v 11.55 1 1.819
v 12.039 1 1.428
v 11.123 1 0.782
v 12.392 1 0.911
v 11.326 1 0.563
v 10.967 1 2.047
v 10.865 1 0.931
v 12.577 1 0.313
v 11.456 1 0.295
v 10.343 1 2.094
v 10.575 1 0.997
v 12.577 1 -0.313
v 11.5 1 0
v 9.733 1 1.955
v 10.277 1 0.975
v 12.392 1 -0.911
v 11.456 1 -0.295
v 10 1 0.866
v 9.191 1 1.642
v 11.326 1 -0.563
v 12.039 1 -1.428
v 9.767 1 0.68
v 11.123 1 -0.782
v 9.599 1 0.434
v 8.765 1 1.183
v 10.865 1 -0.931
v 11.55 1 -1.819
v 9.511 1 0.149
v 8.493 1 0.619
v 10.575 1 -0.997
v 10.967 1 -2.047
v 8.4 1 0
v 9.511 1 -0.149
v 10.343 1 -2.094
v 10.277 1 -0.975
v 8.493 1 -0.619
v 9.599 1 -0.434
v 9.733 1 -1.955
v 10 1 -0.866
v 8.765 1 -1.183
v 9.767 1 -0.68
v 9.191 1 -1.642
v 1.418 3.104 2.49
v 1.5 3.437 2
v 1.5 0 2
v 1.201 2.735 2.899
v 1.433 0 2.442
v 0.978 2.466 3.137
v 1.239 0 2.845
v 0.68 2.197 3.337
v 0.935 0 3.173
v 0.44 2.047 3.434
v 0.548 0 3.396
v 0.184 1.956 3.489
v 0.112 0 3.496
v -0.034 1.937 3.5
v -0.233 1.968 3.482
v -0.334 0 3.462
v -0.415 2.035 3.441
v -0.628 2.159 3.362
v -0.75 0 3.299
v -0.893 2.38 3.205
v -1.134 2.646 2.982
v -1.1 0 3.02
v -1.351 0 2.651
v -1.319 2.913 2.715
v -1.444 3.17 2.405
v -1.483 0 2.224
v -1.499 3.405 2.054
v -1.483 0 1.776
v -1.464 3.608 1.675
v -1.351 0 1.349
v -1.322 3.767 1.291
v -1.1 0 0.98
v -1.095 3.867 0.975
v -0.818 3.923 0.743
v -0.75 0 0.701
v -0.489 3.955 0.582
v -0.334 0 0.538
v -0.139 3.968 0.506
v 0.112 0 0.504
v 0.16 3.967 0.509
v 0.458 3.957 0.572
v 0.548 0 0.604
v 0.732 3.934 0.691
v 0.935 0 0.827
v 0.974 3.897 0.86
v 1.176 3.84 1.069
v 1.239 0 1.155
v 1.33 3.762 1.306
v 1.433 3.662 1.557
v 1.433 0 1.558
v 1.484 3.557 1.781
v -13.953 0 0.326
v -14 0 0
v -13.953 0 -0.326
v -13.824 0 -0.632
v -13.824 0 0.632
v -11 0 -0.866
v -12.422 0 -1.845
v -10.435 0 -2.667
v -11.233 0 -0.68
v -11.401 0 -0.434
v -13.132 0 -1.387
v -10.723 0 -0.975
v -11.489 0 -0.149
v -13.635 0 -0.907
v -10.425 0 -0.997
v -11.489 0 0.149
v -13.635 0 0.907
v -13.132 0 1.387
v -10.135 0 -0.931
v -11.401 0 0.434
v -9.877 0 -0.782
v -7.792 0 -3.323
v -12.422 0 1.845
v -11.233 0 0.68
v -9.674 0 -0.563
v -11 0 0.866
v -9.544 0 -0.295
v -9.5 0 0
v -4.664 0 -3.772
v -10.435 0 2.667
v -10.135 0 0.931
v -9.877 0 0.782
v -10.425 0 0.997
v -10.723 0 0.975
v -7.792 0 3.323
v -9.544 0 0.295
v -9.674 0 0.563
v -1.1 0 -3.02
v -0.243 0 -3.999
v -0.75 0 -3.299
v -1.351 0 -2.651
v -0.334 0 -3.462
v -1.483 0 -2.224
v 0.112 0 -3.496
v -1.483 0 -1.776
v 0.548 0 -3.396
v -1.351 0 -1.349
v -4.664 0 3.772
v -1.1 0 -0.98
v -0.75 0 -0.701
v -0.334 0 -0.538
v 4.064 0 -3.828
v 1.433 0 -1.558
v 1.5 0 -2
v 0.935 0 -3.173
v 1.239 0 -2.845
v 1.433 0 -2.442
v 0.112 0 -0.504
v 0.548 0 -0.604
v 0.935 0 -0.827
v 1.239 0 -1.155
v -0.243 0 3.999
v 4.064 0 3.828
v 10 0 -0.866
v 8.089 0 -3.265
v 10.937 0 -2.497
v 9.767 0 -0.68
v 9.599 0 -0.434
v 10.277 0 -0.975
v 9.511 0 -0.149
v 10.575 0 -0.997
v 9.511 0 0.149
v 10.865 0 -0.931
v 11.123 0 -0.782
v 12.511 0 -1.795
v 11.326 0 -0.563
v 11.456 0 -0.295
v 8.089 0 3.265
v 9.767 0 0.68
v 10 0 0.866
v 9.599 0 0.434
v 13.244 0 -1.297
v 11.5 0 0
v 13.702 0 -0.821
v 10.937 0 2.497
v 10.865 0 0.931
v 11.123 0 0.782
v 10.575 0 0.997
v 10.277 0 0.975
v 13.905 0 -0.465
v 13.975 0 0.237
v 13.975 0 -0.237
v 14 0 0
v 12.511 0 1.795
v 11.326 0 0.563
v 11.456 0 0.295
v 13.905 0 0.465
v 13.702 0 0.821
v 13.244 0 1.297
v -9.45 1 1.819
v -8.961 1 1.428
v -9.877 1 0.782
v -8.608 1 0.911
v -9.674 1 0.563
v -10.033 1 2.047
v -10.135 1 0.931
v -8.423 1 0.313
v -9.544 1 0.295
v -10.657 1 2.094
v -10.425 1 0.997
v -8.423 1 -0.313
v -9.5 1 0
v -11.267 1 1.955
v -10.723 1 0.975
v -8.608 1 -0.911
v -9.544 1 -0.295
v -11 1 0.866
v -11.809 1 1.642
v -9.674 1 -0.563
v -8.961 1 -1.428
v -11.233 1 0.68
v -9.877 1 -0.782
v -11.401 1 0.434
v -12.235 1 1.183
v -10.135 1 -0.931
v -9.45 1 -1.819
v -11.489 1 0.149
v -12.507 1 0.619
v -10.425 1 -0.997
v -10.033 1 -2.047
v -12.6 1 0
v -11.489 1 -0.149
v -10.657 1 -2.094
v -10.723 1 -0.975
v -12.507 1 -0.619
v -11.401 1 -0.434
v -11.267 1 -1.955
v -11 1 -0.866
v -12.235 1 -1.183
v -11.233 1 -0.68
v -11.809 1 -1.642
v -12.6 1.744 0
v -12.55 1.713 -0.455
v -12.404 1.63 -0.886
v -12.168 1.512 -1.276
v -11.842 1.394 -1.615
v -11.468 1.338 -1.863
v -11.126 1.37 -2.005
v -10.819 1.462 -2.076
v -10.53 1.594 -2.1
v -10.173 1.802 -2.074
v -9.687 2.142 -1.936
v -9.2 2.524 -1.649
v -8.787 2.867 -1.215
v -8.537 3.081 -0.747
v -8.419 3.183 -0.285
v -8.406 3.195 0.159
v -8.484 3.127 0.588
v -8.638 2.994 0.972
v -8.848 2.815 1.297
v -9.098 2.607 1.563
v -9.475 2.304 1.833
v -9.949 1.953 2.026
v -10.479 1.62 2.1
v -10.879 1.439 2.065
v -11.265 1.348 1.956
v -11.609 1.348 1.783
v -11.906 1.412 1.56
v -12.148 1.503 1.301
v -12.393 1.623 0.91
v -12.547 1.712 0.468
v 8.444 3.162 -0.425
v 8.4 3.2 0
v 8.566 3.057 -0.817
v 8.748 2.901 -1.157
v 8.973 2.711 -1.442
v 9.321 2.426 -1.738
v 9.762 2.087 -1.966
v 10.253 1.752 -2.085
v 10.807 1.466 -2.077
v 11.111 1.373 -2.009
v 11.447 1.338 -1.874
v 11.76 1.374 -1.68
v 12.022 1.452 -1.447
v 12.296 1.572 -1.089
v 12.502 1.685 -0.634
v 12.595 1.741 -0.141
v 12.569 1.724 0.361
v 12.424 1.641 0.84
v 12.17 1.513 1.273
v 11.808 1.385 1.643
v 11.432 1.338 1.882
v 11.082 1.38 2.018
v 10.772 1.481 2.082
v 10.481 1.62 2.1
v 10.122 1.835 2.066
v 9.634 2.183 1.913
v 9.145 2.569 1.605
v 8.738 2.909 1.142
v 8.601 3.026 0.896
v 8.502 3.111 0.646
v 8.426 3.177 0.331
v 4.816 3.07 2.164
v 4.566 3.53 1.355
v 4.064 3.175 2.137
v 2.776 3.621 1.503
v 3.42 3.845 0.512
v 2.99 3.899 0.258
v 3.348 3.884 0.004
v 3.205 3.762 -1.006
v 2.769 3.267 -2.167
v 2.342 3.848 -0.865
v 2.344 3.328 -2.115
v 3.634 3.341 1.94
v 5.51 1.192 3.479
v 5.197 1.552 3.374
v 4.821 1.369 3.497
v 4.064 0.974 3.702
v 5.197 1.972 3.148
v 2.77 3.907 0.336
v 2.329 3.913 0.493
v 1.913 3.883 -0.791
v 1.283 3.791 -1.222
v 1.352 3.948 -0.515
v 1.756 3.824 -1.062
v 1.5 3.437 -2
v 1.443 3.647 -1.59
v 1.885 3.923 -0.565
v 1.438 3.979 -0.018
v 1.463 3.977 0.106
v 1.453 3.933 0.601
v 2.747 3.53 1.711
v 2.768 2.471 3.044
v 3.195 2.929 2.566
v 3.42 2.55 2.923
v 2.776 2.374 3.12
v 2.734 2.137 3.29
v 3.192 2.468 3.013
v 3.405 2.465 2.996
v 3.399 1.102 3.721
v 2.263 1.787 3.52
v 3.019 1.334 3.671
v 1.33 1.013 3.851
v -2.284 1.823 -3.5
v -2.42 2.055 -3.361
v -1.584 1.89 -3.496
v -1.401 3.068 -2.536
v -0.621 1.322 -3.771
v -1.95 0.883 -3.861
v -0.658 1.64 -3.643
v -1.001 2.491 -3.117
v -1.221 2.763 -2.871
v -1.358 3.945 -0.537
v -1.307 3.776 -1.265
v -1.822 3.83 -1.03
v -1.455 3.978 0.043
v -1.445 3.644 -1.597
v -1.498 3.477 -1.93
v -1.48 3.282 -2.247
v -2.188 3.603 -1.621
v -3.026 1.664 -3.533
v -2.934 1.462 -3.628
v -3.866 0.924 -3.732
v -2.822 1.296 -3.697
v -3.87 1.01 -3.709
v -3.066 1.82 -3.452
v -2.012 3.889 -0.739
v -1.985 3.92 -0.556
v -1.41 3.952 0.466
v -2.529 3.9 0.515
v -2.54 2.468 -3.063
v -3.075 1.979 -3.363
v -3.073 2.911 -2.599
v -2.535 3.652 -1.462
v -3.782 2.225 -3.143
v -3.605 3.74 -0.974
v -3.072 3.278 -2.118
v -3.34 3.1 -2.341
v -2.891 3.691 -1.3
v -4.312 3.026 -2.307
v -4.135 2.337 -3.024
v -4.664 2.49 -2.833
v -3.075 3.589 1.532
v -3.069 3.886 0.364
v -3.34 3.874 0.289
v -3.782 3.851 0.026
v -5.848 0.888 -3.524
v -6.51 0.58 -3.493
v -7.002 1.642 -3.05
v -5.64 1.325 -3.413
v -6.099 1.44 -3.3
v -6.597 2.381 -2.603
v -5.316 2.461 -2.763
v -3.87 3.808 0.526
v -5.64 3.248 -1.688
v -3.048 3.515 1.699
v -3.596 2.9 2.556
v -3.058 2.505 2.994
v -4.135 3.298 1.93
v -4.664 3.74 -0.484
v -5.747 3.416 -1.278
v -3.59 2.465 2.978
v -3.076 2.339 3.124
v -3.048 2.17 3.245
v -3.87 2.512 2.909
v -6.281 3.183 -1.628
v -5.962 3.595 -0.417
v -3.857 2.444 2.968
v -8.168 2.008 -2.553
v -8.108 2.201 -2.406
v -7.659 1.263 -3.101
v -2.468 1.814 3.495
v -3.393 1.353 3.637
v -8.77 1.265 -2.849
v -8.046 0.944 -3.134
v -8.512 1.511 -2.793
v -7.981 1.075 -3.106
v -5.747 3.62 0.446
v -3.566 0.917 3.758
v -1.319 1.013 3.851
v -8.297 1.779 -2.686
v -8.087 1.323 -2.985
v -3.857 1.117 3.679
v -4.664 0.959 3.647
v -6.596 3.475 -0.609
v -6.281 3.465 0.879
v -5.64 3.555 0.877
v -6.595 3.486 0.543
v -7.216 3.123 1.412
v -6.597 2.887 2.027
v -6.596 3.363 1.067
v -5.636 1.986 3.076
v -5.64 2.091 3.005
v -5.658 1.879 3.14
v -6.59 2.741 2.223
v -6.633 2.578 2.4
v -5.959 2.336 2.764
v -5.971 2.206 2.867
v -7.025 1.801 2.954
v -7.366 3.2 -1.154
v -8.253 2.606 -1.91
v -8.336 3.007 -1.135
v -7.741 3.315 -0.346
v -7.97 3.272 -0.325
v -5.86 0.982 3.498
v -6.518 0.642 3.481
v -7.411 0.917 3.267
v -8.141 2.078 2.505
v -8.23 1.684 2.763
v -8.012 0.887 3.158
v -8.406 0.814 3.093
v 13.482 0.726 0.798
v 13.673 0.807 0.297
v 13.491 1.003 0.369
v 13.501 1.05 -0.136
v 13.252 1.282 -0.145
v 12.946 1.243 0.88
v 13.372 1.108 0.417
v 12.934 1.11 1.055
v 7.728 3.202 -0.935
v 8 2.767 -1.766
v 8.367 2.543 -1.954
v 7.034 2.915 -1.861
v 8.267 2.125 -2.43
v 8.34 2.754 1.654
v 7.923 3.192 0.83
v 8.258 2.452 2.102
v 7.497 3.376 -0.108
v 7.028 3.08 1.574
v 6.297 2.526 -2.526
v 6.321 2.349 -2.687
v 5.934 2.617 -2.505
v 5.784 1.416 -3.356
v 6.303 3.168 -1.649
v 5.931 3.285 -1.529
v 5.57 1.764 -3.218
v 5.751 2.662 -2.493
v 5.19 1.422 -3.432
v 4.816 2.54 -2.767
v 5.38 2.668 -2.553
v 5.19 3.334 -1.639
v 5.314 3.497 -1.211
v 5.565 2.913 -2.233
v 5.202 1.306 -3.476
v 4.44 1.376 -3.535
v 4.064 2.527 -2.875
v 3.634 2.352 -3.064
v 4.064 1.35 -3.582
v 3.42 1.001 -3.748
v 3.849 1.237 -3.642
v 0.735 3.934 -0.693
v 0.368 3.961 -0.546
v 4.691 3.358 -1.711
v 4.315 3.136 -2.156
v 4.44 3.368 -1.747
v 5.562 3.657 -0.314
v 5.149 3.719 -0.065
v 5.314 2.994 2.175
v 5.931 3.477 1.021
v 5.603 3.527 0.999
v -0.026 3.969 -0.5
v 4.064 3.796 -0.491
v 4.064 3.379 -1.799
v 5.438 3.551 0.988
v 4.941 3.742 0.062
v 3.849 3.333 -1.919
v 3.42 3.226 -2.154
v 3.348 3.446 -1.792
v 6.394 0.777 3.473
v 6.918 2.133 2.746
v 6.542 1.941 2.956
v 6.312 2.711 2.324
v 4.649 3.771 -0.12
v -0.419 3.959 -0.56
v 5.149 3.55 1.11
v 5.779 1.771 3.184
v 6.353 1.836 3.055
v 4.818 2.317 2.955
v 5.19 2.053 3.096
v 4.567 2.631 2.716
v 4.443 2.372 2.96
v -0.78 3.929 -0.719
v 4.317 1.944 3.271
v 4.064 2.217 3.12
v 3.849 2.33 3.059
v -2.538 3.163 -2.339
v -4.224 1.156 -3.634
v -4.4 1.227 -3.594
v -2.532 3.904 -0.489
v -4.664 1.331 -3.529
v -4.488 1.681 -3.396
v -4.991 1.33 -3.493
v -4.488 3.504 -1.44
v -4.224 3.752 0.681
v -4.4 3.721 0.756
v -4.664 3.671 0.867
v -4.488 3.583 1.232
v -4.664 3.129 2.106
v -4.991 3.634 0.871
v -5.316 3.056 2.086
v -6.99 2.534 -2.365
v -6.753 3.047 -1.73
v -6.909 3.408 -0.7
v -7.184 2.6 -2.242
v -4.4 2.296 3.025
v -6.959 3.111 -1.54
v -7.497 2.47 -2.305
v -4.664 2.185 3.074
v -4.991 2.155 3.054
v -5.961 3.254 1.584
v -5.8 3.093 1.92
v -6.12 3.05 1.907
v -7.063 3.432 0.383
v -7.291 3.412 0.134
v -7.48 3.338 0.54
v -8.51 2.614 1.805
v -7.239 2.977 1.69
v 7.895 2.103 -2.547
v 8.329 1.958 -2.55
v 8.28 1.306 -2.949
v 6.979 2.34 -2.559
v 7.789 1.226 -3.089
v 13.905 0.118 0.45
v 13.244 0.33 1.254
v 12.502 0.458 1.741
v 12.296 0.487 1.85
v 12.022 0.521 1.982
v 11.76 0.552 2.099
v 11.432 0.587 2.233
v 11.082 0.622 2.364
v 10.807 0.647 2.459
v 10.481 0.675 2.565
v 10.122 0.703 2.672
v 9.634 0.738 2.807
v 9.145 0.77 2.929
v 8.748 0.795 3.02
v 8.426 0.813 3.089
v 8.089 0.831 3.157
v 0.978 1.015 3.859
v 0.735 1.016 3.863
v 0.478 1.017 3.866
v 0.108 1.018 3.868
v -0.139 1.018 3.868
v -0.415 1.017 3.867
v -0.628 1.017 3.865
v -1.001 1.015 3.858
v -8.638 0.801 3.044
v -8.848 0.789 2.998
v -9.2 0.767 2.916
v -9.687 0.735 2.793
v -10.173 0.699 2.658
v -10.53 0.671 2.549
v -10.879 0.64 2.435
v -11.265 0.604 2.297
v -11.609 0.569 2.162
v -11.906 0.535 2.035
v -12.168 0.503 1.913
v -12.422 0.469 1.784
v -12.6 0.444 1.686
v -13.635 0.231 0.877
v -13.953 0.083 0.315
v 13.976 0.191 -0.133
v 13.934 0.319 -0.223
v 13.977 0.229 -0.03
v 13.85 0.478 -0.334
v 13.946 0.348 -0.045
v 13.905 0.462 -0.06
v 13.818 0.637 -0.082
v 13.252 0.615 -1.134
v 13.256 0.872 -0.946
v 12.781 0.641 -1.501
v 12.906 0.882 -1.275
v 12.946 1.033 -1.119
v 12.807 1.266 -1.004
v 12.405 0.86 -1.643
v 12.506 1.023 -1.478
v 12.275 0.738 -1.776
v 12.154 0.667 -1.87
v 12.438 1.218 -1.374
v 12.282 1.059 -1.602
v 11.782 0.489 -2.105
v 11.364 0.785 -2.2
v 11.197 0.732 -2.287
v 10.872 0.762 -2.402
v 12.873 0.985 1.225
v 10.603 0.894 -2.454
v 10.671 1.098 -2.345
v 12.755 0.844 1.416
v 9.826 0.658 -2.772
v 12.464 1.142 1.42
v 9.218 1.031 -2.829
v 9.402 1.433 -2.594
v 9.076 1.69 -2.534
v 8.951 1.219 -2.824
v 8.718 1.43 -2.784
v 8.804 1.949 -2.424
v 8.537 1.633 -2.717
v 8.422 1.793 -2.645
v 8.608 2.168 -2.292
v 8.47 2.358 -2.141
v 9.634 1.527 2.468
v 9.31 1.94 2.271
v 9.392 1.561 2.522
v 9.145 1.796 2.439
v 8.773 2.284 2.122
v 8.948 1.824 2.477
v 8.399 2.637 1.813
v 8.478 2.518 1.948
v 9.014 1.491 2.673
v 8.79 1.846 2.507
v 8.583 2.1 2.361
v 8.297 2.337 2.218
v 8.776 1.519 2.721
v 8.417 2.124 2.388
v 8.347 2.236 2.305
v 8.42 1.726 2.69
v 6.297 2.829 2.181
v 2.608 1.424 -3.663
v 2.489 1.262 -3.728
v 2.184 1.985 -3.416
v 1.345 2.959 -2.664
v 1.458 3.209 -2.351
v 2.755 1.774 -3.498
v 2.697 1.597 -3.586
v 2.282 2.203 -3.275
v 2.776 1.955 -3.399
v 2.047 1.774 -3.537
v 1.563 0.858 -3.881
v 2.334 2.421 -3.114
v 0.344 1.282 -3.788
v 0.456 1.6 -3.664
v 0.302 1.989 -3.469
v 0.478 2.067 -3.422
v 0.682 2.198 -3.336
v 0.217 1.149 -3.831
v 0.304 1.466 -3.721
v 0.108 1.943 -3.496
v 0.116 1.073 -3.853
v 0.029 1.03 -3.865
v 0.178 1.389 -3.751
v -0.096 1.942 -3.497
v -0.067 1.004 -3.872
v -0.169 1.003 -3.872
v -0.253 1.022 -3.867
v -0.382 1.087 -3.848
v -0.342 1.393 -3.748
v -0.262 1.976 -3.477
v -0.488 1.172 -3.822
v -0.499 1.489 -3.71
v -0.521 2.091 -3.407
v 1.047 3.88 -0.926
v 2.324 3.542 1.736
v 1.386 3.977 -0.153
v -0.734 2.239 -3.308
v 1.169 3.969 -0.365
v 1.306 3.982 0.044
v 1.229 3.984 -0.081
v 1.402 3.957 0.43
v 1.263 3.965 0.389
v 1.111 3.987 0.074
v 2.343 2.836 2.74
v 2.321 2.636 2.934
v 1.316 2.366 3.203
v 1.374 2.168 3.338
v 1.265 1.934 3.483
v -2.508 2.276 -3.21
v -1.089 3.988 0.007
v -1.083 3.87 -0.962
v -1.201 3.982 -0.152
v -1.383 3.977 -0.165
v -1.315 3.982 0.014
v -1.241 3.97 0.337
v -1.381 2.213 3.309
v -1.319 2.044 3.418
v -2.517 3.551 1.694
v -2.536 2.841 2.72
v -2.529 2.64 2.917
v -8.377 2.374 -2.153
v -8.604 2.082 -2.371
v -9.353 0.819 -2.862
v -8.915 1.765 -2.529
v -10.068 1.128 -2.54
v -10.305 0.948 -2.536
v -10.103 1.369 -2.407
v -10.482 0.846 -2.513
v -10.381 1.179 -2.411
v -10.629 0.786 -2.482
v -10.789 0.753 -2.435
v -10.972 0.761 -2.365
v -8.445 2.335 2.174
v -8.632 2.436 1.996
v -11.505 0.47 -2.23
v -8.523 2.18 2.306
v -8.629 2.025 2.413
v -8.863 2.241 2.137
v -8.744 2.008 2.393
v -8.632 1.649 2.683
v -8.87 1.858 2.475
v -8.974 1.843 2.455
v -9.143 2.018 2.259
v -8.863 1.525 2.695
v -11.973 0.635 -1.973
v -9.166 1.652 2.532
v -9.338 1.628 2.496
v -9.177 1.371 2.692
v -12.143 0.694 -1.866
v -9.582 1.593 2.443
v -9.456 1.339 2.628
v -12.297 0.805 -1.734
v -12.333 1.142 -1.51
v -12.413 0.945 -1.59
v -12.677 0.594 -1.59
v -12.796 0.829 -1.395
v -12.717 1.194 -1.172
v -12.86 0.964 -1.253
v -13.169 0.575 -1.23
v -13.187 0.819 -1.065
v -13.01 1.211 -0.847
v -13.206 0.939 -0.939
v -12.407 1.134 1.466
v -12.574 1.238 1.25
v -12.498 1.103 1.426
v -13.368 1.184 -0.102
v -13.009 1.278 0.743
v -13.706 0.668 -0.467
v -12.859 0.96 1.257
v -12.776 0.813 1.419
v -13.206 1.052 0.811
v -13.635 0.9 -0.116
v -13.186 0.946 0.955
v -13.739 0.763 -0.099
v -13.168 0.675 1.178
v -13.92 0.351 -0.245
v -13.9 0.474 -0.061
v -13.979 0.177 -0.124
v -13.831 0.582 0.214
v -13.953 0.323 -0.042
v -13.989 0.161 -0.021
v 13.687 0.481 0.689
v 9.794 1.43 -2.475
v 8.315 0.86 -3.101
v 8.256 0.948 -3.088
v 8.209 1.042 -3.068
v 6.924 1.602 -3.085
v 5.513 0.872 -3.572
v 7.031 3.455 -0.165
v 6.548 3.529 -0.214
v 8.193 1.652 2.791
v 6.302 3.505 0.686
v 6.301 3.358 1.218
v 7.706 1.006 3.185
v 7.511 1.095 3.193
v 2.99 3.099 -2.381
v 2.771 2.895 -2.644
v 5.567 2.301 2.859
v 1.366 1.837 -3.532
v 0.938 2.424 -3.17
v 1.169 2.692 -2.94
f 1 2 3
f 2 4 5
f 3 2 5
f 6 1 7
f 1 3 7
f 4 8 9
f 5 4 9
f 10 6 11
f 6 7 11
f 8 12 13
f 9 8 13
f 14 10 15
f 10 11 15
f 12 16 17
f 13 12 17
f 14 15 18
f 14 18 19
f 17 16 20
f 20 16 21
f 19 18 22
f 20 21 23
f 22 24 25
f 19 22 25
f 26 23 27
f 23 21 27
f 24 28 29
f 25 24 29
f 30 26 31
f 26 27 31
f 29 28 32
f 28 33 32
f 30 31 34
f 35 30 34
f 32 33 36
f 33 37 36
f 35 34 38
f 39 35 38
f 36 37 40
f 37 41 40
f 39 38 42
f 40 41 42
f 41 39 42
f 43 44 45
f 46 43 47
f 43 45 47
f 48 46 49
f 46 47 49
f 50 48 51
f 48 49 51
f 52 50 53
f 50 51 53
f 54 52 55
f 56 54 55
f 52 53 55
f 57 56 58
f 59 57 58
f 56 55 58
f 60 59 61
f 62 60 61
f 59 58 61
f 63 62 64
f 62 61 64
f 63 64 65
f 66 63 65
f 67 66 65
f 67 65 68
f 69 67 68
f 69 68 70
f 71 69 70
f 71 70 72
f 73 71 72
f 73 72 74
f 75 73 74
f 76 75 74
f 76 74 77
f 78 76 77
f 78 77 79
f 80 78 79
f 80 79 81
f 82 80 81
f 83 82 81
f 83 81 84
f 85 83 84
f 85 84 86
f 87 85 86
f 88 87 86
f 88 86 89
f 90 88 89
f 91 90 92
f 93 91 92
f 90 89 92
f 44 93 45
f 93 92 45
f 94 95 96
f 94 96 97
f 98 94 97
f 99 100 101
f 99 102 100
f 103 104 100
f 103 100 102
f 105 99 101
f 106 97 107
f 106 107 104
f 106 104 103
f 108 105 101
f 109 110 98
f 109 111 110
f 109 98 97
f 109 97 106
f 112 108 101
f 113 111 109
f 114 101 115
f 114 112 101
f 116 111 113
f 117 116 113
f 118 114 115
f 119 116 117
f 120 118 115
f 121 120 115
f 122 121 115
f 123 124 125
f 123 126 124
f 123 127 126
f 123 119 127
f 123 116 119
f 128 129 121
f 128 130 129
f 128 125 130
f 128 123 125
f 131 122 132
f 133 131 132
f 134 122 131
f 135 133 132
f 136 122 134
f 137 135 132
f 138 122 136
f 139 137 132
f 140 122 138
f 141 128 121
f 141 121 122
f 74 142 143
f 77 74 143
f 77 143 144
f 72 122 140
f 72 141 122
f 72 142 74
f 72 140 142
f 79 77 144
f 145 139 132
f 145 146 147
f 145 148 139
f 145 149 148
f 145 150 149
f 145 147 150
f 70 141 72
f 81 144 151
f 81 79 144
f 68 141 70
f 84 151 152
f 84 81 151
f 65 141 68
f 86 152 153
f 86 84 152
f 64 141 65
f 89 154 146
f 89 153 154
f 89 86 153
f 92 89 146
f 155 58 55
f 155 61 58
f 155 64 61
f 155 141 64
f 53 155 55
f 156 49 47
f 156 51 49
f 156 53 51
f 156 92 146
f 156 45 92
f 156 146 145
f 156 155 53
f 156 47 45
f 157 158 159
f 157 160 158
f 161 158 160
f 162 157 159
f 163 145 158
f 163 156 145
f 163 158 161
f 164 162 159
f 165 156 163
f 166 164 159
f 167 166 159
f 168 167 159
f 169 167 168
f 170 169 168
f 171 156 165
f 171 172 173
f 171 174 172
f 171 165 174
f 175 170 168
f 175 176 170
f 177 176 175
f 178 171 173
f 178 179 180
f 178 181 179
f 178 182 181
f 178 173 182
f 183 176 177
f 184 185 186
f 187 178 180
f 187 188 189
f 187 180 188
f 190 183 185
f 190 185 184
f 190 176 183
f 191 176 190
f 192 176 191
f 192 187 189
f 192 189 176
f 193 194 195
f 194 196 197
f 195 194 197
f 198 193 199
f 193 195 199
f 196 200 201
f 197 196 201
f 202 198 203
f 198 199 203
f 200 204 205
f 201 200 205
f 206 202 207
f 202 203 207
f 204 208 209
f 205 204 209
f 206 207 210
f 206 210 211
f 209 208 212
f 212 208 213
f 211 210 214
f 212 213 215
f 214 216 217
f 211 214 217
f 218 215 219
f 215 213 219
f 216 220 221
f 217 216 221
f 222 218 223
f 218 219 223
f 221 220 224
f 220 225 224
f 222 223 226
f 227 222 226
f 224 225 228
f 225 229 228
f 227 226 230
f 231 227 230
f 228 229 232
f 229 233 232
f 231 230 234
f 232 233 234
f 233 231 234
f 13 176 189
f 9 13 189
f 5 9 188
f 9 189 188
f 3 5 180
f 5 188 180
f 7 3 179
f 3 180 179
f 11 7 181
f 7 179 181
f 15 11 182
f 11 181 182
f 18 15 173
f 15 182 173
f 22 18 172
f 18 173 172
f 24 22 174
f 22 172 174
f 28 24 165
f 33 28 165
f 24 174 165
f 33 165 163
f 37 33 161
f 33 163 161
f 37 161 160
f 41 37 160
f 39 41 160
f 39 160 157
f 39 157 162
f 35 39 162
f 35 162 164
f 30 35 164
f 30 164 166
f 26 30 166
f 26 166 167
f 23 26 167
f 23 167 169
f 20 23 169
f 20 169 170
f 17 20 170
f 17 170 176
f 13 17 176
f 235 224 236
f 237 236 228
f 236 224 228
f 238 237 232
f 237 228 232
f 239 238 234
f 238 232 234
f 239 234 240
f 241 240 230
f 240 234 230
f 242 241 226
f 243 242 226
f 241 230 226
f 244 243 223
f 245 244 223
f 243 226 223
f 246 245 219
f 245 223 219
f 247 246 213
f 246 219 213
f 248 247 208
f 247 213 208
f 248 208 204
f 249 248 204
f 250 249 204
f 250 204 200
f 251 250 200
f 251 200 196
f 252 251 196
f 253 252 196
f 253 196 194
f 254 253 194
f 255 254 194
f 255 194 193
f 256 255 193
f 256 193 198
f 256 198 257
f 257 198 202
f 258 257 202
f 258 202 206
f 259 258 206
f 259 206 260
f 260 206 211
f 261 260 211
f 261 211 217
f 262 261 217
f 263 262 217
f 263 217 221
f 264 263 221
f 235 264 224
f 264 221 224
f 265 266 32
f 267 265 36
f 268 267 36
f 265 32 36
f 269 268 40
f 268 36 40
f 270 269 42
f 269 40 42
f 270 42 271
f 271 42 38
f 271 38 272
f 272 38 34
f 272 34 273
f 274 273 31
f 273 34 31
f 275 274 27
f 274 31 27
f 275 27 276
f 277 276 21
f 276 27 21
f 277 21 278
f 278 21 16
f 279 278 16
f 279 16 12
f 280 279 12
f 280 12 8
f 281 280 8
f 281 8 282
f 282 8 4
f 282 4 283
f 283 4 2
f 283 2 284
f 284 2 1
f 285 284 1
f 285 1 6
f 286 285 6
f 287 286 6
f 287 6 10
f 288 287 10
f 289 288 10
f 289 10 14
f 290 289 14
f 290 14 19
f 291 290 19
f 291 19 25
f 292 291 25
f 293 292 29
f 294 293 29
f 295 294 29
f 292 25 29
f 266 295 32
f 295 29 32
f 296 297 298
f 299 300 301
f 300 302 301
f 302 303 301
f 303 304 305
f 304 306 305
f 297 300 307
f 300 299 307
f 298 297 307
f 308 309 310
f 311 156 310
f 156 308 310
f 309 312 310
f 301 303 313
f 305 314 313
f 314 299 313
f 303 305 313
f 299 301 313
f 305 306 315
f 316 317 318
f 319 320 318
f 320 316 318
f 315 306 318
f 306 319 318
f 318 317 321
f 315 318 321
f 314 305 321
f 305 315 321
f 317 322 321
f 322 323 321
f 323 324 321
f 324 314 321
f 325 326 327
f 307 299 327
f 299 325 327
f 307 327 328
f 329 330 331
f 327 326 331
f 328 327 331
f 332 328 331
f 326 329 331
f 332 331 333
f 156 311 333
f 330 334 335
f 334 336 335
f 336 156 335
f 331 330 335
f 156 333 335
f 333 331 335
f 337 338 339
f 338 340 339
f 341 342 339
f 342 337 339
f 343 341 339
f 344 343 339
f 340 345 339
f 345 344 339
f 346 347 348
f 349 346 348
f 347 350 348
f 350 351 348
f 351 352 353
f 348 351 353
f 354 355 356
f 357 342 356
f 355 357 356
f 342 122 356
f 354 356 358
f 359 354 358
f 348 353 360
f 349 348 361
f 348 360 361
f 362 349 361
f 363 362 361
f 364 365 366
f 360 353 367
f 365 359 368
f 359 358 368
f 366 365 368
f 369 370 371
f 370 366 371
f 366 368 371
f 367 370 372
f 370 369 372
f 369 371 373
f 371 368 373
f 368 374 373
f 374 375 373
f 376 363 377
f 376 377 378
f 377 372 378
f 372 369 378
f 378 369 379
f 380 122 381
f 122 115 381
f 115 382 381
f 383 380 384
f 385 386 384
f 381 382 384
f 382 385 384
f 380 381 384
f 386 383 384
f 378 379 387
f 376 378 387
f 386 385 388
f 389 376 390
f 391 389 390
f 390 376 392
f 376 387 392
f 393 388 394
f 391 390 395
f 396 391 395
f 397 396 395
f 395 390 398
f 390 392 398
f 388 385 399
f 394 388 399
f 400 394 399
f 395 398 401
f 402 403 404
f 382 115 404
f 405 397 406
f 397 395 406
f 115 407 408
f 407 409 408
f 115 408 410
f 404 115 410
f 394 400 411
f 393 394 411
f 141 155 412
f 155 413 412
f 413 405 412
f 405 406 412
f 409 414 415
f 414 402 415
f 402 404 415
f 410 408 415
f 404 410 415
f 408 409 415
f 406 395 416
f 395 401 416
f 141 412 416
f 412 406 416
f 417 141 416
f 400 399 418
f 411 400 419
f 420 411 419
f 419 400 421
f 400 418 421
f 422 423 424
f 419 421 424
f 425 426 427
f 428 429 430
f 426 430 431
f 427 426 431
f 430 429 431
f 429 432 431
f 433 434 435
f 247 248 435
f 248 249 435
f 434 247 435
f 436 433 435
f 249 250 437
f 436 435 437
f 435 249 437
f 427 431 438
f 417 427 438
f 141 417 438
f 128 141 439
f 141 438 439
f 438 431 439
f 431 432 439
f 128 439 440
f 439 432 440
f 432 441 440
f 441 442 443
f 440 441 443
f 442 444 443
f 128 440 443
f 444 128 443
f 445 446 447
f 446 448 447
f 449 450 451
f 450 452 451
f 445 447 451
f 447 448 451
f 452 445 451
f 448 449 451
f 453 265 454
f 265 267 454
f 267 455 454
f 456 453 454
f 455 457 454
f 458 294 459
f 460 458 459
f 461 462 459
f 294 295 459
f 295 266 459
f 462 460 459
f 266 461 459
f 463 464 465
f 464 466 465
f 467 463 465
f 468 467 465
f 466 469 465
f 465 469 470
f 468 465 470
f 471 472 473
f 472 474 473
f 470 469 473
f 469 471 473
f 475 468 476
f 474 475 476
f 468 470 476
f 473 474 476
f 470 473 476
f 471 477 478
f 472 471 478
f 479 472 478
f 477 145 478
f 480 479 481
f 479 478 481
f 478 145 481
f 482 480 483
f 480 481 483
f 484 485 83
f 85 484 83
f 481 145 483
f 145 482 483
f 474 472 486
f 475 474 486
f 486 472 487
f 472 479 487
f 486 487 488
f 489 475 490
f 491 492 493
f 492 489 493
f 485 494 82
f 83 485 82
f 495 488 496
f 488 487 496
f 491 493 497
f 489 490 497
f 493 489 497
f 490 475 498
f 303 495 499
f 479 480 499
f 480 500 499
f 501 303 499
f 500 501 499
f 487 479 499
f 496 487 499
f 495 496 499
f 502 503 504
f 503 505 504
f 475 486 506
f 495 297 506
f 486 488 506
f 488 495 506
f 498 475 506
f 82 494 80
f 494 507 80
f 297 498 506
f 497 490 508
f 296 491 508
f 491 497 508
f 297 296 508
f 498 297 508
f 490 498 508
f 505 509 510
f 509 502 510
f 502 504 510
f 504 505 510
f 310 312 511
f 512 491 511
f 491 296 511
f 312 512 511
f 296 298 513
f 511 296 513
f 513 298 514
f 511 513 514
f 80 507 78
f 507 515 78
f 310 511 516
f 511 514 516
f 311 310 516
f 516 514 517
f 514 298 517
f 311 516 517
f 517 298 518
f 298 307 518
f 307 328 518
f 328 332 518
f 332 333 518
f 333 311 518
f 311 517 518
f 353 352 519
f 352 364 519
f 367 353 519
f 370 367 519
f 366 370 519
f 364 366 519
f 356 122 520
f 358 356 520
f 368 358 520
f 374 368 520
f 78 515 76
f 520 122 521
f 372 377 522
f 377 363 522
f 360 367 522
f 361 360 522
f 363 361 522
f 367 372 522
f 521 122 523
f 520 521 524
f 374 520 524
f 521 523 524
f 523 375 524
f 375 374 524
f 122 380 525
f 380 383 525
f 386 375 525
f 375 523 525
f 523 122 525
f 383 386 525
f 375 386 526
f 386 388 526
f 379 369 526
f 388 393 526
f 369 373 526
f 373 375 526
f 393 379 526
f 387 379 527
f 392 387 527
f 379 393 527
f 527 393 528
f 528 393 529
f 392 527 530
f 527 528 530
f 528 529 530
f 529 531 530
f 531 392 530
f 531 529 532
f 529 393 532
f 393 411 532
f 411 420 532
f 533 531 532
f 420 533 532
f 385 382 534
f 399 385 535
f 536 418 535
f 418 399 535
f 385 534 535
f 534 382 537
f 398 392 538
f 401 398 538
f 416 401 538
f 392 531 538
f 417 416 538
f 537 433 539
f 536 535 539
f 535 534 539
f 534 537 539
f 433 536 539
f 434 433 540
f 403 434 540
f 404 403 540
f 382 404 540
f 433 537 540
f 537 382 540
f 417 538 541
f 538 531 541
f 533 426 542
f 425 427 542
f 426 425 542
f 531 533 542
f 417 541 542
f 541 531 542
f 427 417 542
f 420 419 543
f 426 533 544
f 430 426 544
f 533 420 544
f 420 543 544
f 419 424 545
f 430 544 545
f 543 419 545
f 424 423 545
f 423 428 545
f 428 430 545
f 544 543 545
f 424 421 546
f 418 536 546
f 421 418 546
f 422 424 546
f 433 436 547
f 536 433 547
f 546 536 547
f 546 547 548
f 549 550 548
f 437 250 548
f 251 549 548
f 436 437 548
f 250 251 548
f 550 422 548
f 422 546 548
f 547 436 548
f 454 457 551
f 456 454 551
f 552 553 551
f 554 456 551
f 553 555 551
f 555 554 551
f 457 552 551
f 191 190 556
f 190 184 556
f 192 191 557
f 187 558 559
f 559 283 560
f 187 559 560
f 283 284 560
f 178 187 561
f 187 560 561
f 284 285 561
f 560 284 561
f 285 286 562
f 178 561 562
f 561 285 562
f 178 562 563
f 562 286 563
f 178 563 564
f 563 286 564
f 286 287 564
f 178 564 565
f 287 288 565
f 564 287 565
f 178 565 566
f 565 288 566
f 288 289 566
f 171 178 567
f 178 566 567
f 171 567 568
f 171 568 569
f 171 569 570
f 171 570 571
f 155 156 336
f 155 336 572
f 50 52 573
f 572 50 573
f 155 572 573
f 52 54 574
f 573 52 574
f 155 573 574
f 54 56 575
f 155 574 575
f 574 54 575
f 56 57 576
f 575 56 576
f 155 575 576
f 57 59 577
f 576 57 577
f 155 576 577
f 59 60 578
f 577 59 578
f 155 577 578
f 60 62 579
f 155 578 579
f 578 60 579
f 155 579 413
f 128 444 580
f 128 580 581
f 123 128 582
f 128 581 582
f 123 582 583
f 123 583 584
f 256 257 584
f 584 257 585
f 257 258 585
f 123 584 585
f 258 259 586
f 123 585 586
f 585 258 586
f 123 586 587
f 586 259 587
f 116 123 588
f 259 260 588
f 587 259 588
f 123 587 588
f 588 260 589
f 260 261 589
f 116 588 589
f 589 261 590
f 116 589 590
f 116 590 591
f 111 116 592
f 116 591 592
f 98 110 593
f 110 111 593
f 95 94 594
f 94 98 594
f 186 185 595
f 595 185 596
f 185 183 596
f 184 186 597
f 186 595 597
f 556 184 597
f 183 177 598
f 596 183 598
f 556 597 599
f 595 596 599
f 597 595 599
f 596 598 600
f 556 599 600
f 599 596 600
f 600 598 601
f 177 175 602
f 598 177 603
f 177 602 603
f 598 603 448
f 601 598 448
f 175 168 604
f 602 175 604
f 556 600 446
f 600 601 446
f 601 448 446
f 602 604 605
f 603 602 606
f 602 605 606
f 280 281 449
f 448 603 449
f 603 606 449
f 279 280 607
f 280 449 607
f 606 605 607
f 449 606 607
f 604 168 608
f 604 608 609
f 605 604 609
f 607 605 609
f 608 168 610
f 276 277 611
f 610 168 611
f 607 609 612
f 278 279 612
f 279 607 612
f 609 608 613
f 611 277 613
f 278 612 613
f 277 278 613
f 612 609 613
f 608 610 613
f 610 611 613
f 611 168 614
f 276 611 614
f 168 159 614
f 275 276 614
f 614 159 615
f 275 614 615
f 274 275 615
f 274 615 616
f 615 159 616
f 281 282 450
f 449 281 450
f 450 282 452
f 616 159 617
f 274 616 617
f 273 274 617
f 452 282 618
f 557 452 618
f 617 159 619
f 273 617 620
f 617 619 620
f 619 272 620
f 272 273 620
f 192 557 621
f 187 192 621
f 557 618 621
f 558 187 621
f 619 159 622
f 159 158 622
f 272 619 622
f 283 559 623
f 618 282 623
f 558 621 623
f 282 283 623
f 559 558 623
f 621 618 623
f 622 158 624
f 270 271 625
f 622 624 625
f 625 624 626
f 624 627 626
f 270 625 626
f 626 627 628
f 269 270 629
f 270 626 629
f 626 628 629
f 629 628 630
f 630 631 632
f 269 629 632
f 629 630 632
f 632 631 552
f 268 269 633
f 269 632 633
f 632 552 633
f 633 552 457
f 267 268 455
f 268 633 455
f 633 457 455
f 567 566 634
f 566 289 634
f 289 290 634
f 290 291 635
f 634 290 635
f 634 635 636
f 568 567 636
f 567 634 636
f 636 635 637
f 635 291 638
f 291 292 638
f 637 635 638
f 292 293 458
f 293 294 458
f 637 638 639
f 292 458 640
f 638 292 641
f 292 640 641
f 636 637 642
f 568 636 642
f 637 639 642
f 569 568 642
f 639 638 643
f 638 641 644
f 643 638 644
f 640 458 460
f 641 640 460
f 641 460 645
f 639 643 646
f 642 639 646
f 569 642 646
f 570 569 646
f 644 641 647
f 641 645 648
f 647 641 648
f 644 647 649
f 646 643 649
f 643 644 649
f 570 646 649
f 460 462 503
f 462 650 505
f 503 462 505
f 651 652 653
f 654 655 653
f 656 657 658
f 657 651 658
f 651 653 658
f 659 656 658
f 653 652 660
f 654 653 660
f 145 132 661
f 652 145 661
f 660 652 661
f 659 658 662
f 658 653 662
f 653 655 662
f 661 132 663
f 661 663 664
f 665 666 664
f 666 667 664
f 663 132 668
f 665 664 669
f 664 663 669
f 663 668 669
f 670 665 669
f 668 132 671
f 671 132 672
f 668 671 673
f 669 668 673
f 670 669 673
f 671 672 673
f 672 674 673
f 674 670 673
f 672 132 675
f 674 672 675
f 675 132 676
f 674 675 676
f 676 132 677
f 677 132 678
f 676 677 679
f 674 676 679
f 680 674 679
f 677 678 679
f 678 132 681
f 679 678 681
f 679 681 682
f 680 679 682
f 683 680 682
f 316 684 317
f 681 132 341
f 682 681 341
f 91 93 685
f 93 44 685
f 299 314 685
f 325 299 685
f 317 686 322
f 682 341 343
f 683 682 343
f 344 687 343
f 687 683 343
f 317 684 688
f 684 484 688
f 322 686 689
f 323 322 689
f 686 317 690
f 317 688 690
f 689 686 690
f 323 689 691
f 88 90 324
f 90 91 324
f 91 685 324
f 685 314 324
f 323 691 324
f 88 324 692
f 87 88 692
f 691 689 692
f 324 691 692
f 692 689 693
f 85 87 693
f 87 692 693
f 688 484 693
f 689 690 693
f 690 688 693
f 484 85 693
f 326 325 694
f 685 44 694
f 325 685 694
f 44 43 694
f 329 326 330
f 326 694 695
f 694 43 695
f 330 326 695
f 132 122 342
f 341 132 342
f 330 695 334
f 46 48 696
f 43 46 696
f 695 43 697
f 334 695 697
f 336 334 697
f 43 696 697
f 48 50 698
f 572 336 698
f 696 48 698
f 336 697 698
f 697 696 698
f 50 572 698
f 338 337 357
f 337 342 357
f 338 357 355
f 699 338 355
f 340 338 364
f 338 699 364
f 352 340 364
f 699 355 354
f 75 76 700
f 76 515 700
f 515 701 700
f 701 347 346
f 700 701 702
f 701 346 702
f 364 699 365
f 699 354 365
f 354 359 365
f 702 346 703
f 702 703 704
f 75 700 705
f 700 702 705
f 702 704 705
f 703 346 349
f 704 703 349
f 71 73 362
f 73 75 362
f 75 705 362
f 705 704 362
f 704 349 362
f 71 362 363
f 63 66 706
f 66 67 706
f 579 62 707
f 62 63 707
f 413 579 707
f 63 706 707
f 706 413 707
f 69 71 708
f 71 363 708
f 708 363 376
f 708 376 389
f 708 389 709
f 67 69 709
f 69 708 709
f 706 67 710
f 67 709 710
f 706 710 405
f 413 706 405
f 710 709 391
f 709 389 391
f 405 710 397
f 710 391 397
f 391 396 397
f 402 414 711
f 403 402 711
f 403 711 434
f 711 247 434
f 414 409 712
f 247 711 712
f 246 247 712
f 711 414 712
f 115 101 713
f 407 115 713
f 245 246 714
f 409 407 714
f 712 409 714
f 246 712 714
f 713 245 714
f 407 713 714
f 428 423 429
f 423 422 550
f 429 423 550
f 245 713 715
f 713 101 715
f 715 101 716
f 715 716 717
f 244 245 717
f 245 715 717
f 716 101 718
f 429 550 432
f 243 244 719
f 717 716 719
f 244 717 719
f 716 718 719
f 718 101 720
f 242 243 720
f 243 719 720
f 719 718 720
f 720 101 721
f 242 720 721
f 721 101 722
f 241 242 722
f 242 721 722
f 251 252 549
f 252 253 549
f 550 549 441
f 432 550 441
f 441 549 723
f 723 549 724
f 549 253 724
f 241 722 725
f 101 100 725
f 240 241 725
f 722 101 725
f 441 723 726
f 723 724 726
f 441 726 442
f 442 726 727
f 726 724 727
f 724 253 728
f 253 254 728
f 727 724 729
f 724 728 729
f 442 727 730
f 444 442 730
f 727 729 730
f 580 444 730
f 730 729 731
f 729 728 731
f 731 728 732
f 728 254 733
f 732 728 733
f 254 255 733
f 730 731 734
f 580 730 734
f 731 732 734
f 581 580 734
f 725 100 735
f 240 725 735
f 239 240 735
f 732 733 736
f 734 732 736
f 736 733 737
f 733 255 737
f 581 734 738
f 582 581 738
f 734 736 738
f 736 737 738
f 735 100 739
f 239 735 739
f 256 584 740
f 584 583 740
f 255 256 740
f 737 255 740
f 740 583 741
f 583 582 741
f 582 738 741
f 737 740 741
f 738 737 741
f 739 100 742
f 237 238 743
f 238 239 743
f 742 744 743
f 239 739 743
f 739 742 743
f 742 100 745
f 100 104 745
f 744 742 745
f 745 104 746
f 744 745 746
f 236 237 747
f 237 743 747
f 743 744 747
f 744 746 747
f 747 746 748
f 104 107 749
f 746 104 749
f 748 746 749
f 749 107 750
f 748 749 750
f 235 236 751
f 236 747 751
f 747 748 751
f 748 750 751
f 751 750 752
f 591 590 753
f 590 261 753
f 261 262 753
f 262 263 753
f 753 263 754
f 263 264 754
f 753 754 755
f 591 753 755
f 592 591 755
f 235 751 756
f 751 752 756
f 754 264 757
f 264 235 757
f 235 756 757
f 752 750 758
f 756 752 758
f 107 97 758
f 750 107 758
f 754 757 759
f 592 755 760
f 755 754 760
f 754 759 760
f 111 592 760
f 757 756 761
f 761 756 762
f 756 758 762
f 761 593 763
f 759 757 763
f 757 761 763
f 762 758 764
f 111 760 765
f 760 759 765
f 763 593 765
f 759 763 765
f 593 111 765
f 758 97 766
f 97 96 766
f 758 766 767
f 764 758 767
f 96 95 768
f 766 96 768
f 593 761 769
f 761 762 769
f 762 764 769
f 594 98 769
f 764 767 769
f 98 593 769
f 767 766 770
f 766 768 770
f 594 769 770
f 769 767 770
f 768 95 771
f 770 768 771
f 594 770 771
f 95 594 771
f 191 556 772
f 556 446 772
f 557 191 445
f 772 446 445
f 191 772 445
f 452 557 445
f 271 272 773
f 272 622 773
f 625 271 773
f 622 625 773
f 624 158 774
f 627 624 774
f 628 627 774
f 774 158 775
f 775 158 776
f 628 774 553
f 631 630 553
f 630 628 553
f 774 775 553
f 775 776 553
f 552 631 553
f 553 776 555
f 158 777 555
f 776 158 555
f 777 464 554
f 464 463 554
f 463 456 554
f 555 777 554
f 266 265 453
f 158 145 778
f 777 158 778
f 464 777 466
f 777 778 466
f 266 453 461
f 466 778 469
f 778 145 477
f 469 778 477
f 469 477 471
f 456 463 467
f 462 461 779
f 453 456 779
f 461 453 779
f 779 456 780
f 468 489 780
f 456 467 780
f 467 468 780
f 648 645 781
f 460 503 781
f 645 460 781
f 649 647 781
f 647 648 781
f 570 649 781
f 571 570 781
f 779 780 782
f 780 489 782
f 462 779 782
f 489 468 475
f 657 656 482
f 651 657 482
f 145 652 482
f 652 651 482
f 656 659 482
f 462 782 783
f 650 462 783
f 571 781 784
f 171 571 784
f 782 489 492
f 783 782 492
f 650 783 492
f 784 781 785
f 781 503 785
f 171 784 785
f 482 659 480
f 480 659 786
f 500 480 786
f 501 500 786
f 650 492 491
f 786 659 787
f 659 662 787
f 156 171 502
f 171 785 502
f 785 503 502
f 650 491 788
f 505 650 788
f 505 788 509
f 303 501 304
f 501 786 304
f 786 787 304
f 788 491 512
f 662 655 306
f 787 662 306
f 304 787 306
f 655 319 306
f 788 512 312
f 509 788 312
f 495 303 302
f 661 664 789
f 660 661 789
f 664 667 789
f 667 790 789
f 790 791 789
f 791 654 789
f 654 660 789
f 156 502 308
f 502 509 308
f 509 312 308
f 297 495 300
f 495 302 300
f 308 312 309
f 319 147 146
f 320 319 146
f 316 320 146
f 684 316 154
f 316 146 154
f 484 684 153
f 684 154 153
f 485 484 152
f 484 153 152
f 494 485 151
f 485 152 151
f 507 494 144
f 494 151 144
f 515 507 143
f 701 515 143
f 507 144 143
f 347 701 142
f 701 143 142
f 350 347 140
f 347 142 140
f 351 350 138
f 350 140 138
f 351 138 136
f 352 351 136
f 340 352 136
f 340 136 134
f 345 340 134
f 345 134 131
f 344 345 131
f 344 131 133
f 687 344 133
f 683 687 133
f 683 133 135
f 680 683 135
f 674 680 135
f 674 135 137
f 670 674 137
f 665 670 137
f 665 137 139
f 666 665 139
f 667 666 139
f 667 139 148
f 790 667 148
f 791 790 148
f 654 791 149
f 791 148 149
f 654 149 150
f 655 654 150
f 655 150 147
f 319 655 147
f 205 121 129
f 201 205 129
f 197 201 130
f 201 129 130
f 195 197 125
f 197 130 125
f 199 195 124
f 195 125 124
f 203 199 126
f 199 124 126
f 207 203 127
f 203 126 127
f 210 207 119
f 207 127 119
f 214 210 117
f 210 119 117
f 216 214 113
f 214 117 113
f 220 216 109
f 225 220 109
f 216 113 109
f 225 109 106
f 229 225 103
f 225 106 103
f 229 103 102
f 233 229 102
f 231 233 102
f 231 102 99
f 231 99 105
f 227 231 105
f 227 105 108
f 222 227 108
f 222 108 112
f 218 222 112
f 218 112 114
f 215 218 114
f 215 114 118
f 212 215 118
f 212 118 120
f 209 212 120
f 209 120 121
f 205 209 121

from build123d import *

# Parameters (mm, degrees)
SKETCH2_W               = 50.634745493
SKETCH2_H               = 13.07277583
CUT_EXTRUDE1_DEPTH      = 5.0000001
CUT_EXTRUDE1_DEPTH_BACK = 5.0000001
SKETCH3_R               = 1
CUT_EXTRUDE2_DEPTH      = 5.0000001
SKETCH4_R               = 2.1
CUT_EXTRUDE3_DEPTH      = 4.0000001
SKETCH5_R               = 1.5
CUT_EXTRUDE4_DEPTH      = 5.0000001


with BuildPart() as part:
    # Sketch1 → Revolve1 (revolve)
    with BuildSketch(Plane.XY):
        with BuildLine():
            Line((-14, 0), (14, 0))
            add(Edge.make_bspline(
                [(14, 0), (14, 4), (0, 4), (-14, 4), (-14, 0)],
                knots=[0, 0, 0, 1.570796327, 1.570796327, 3.141592654, 3.141592654, 3.141592654], degree=2, weights=[1, 0.707106781, 1, 0.707106781, 1]))
        make_face()
    revolve(axis=Axis((-14, 0, 0), (1, 0, 0)))

    # Sketch2 → Cut-Extrude1 (cut, two sides)
    with BuildSketch(Plane.XY) as cut_extrude1_sk:
        with Locations((-1.598405816, -6.536387915)):
            Rectangle(SKETCH2_W, SKETCH2_H)
    extrude(amount=CUT_EXTRUDE1_DEPTH, mode=Mode.SUBTRACT)
    extrude(cut_extrude1_sk.sketch, amount=-CUT_EXTRUDE1_DEPTH_BACK, mode=Mode.SUBTRACT)

    # Sketch3 → Cut-Extrude2 (cut, through all)
    with BuildSketch(Plane.XZ):
        with Locations((-10.5, 0)):
            Circle(SKETCH3_R)
        with Locations((10.5, 0)):
            Circle(SKETCH3_R)
    extrude(amount=-CUT_EXTRUDE2_DEPTH, mode=Mode.SUBTRACT)

    # Sketch4 → Cut-Extrude3 (cut, through all)
    with BuildSketch(Plane(origin=(0, 1, 0), x_dir=(-1, 0, 0), z_dir=(0, -1, 0))):
        with Locations((10.5, 0)):
            Circle(SKETCH4_R)
        with Locations((-10.5, 0)):
            Circle(SKETCH4_R)
    extrude(amount=-CUT_EXTRUDE3_DEPTH, mode=Mode.SUBTRACT)

    # Sketch5 → Cut-Extrude4 (cut, through all)
    with BuildSketch(Plane.XZ):
        with Locations((0, 2)):
            Circle(SKETCH5_R)
        with Locations((0, -2)):
            Circle(SKETCH5_R)
    extrude(amount=-CUT_EXTRUDE4_DEPTH, mode=Mode.SUBTRACT)


solid = part.part
